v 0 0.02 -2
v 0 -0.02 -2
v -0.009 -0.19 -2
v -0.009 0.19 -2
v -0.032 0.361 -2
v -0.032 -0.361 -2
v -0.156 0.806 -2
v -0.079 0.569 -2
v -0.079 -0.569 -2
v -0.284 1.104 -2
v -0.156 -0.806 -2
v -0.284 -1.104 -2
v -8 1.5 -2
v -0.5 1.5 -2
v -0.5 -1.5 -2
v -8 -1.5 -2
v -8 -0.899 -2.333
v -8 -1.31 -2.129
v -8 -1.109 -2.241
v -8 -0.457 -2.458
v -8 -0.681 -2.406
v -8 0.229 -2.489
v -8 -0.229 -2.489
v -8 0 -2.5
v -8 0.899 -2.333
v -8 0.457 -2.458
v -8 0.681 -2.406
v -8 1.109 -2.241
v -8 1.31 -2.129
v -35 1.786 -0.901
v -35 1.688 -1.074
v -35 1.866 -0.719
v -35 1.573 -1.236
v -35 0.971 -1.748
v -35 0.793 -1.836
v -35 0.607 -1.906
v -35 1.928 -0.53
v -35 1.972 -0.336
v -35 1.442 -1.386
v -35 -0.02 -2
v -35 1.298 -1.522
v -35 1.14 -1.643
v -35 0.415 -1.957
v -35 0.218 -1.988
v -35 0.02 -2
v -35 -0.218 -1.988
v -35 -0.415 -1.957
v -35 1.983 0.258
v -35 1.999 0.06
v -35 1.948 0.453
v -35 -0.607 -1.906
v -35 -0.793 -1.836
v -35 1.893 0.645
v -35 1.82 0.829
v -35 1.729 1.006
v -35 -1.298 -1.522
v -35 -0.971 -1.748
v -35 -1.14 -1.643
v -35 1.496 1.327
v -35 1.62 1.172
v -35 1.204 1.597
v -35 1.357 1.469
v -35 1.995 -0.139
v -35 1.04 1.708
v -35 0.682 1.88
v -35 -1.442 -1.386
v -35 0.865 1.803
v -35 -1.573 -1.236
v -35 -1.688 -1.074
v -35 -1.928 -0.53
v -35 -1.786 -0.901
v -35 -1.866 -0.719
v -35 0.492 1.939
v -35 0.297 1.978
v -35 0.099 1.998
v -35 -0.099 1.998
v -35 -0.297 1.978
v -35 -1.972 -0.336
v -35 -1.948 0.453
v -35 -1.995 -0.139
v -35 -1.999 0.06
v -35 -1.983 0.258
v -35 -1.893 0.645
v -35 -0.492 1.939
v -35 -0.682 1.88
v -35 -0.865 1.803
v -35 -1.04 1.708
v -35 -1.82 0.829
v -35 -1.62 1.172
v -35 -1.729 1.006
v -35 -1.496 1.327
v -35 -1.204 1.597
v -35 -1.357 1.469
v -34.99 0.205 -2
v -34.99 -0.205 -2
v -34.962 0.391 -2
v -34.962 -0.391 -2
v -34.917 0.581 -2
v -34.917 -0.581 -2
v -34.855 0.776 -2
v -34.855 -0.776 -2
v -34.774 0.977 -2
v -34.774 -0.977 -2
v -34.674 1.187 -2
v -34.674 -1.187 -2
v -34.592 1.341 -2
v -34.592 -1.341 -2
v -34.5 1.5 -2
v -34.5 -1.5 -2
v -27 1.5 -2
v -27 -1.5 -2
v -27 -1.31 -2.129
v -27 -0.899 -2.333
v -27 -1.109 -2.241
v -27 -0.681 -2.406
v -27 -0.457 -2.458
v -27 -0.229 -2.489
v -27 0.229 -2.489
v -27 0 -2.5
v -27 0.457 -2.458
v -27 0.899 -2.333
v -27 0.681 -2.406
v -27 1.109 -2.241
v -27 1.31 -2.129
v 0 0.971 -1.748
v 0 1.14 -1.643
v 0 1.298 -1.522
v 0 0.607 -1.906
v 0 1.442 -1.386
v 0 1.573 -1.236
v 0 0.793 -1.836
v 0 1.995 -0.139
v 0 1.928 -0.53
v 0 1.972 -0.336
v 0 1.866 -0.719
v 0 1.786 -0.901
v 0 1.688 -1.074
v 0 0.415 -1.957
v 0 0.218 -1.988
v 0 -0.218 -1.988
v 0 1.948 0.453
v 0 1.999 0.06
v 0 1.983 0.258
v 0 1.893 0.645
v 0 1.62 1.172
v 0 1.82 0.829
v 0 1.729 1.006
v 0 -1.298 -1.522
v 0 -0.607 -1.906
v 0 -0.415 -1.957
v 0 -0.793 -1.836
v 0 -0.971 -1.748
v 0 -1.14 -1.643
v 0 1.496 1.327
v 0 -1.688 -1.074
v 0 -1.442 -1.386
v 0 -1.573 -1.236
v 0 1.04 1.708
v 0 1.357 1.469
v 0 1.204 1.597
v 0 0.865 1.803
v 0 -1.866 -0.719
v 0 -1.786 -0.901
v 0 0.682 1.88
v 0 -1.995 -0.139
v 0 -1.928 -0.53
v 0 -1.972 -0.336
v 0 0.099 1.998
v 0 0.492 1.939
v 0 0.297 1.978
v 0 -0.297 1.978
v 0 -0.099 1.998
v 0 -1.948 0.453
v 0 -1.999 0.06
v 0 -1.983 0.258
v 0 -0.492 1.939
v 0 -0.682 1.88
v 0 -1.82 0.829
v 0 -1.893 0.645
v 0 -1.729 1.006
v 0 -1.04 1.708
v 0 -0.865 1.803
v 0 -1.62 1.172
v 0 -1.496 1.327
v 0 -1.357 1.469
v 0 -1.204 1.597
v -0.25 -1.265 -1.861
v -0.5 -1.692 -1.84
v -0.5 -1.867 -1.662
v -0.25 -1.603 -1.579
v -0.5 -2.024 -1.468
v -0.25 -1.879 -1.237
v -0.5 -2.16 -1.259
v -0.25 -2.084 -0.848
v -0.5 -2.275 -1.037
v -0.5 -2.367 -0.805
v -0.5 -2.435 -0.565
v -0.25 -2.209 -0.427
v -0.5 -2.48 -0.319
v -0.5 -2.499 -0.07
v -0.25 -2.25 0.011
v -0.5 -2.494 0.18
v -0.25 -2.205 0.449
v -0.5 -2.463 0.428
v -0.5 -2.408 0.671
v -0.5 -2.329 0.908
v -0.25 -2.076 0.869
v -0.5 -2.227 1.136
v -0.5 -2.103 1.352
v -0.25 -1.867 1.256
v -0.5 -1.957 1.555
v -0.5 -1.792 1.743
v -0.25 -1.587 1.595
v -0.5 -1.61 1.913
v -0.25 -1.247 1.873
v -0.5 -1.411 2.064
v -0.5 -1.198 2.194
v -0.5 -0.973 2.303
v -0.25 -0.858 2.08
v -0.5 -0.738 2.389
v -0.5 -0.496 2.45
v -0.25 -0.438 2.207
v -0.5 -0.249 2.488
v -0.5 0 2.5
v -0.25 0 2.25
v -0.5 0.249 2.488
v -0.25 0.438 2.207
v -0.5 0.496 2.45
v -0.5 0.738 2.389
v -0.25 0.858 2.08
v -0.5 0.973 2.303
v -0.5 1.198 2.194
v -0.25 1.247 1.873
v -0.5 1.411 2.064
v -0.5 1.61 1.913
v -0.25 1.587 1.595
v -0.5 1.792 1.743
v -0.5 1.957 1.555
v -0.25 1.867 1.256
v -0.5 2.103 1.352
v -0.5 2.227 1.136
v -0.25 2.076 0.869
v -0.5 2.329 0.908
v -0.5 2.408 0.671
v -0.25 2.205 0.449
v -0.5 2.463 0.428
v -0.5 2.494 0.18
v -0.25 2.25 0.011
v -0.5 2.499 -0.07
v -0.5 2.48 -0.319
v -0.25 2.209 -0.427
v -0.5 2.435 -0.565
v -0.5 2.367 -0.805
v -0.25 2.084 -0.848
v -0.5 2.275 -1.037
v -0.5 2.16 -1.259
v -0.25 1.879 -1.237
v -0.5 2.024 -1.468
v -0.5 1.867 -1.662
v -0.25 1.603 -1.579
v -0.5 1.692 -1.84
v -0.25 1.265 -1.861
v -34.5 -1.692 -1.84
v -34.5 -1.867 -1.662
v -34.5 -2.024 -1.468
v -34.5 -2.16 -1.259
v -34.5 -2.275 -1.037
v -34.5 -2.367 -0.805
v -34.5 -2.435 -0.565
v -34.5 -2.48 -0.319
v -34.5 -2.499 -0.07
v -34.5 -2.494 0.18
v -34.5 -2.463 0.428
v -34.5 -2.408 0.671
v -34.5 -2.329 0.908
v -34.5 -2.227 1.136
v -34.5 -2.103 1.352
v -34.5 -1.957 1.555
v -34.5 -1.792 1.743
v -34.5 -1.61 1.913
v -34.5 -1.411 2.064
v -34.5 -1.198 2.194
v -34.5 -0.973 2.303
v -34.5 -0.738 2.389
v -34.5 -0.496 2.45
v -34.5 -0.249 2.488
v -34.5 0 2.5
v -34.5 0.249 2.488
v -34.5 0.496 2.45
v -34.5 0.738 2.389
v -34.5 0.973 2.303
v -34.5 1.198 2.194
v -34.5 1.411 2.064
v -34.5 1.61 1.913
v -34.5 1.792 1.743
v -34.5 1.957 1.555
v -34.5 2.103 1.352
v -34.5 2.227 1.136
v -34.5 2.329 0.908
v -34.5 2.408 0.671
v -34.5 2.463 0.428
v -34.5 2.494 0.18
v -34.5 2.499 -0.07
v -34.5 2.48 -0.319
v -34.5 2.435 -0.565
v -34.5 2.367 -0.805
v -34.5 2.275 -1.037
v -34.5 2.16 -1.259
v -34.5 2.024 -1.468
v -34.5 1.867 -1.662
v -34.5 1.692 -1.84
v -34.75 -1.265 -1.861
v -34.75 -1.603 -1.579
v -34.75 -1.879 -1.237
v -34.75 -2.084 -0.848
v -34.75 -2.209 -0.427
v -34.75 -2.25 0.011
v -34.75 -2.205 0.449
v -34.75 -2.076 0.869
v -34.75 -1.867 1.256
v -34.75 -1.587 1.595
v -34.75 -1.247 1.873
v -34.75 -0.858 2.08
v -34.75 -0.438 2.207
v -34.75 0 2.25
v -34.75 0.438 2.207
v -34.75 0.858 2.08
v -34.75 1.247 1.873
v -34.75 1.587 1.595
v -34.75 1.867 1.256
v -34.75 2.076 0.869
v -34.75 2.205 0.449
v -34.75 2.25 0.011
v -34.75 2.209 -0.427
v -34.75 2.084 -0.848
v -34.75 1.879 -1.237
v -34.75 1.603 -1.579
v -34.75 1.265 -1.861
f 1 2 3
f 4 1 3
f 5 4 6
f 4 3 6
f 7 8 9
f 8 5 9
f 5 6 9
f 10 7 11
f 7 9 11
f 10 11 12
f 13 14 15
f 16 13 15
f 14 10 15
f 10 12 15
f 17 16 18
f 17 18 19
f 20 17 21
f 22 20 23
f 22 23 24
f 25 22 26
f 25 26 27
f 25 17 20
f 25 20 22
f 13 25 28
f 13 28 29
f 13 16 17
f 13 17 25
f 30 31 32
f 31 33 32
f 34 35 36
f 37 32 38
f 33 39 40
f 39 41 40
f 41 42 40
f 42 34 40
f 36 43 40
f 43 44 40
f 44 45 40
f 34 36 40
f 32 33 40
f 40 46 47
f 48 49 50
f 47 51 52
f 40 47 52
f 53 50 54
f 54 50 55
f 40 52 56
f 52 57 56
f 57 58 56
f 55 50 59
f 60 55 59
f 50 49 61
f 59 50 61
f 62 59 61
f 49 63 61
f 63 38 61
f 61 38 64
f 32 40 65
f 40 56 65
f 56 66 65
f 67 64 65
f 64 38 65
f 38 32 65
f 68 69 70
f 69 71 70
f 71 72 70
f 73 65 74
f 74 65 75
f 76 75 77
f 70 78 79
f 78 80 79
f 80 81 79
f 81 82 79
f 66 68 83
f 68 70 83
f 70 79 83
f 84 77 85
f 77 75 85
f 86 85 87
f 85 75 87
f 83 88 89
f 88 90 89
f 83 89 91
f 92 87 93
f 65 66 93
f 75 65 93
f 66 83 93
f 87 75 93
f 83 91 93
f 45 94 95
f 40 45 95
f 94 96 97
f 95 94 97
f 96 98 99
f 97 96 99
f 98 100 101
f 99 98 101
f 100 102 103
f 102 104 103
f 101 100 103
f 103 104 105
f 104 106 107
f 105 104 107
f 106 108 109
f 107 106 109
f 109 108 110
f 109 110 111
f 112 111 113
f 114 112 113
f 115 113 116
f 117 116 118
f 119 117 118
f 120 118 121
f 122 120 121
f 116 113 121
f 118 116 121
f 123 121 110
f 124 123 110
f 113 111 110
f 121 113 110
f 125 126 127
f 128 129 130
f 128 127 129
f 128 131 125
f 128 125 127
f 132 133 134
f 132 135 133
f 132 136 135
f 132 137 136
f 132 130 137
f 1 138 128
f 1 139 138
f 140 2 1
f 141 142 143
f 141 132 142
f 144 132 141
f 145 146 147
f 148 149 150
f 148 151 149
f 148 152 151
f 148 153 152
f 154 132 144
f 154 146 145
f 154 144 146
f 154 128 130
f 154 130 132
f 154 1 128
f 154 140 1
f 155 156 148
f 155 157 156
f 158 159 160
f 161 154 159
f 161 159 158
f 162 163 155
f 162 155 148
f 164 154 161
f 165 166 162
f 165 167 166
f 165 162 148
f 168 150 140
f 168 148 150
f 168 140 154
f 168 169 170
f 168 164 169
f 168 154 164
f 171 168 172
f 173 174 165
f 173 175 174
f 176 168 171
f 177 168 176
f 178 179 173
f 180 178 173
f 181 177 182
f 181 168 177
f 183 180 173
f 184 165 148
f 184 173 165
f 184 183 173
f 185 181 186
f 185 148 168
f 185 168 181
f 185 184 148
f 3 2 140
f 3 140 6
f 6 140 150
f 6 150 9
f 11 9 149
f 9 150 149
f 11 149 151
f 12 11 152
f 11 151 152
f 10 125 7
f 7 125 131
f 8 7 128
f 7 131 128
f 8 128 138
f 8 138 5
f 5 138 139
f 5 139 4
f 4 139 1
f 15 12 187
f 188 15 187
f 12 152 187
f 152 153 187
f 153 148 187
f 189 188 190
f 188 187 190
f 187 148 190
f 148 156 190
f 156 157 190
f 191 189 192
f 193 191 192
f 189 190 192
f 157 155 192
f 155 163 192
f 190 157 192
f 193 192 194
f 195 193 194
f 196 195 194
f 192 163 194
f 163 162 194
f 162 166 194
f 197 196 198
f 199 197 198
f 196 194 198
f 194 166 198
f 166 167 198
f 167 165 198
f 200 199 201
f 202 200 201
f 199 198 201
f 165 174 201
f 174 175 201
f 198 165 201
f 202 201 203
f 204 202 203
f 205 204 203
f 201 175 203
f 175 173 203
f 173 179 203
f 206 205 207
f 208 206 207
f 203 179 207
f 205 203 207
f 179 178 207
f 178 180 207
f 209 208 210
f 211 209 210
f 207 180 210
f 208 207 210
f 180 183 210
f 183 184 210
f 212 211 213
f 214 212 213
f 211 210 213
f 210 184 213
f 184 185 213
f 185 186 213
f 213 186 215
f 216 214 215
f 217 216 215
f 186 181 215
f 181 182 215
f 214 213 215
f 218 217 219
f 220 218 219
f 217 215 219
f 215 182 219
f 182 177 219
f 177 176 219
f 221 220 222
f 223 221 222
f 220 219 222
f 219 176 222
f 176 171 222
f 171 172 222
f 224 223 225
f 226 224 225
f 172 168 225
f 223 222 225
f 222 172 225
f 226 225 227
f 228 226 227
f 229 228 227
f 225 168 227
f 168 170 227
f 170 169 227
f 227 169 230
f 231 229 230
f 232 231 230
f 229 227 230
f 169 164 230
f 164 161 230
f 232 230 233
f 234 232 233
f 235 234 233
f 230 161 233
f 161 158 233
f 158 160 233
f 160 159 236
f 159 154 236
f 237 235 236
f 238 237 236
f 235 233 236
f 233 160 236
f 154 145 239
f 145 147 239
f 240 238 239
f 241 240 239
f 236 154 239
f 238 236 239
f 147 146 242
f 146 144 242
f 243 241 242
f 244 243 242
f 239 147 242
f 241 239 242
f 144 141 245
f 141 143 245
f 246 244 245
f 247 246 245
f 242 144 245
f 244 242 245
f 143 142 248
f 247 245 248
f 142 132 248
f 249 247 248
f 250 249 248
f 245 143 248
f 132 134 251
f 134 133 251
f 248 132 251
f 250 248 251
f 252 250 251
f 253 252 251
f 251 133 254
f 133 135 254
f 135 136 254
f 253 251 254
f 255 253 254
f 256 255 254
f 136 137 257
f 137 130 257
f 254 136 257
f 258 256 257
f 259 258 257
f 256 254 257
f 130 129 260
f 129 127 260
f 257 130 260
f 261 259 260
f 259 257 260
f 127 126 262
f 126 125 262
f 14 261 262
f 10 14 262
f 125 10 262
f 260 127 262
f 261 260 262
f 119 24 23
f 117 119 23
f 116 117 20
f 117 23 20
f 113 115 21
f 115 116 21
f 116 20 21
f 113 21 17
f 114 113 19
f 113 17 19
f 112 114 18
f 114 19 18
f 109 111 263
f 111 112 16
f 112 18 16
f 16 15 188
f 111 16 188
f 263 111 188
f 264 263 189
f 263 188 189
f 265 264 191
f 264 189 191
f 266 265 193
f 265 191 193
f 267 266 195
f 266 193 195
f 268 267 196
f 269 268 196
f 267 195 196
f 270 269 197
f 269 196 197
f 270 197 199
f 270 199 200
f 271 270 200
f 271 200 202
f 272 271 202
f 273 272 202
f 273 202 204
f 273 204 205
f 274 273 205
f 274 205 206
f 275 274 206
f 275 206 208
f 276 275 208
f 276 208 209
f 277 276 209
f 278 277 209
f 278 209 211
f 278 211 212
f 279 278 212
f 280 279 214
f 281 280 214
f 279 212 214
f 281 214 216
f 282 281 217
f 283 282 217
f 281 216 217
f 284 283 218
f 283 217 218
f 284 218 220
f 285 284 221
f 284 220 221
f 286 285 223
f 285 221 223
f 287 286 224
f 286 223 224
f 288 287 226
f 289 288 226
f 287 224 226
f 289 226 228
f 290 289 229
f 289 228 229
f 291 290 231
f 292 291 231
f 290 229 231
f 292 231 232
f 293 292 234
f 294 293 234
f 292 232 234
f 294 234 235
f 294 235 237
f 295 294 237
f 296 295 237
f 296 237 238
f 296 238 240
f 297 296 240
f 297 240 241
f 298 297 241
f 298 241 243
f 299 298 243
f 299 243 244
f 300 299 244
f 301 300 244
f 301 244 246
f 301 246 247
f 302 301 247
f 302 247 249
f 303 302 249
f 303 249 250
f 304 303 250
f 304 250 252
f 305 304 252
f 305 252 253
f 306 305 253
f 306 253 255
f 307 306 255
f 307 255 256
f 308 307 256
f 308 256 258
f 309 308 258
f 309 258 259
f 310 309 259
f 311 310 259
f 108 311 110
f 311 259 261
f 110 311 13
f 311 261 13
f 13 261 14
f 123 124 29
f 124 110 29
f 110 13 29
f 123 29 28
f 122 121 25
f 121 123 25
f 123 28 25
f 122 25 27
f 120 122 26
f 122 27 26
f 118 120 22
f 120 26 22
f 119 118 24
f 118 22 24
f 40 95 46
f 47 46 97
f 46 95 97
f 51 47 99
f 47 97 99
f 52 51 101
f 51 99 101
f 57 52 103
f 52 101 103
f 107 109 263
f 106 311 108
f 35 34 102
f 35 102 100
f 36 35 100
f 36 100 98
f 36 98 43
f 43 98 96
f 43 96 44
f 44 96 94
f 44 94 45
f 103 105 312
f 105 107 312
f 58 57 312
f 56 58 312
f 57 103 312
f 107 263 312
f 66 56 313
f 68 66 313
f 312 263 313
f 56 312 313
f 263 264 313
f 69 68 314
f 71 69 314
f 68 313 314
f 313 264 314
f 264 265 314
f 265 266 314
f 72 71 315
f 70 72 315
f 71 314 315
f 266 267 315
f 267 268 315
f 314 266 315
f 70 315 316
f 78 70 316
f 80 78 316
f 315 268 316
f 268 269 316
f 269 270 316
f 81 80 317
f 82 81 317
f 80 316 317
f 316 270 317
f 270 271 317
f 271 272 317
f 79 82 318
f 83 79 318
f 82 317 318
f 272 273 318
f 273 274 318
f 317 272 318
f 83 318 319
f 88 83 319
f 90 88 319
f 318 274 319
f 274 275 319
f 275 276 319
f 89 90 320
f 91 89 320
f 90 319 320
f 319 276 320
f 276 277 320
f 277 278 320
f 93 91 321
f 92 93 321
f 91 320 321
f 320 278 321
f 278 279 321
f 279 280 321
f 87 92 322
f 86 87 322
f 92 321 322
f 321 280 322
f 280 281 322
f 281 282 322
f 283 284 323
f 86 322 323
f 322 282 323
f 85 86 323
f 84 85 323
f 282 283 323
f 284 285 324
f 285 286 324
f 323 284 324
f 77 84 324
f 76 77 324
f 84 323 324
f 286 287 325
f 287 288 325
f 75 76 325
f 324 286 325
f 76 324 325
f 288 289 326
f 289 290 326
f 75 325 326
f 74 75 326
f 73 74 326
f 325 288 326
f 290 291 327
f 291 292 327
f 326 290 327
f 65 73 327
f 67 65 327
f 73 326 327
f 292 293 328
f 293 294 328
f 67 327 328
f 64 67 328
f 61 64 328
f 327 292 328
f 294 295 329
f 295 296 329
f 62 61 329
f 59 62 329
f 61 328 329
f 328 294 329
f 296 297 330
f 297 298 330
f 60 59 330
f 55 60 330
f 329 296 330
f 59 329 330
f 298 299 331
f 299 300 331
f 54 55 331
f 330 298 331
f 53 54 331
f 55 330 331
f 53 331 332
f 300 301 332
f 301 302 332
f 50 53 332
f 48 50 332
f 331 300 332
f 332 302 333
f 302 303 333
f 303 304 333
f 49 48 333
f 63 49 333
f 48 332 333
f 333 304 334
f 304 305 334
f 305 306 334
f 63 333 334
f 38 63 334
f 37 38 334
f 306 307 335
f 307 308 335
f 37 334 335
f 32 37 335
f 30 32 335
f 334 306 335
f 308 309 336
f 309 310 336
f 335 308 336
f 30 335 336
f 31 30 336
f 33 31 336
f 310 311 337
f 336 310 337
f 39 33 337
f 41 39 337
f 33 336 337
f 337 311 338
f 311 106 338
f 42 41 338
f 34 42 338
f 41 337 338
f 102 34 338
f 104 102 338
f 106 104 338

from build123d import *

# Parameters (mm, degrees)
SKETCH1_W          = 35
SKETCH1_H          = 2.5
CUT_EXTRUDE1_START = -8
CUT_EXTRUDE1_DEPTH = 8
CUT_EXTRUDE2_DEPTH = 8
CHAMFER1_SIZE      = 0.5


with BuildPart() as part:
    # Sketch1 → Revolve1 (revolve)
    with BuildSketch(Plane(origin=(0, 0, 0), x_dir=(1, 0, 0), z_dir=(0, 1, 0))):
        with Locations((-17.5, 1.25)):
            Rectangle(SKETCH1_W, SKETCH1_H)
    revolve(axis=Axis((0, 0, 0), (-1, 0, 0)))

    # Sketch2 → Cut-Extrude1 (cut)
    with BuildSketch(Plane.ZY.offset(35).offset(CUT_EXTRUDE1_START)):
        with BuildLine():
            Line((-2, 1.5), (-2, -1.5))
            ThreePointArc((-2, -1.5), (-2.5, 0), (-2, 1.5))
        make_face()
    extrude(amount=CUT_EXTRUDE1_DEPTH, mode=Mode.SUBTRACT)

    # Sketch3 → Cut-Extrude2 (cut)
    with BuildSketch(Plane(origin=(0, 0, 0), x_dir=(0, 0, -1), z_dir=(1, 0, 0))):
        with BuildLine():
            Line((2, 1.5), (2, -1.5))
            ThreePointArc((2, -1.5), (2.5, 0), (2, 1.5))
        make_face()
    extrude(amount=-CUT_EXTRUDE2_DEPTH, mode=Mode.SUBTRACT)

    # Chamfer1
    chamfer1_edges = [part.edges().sort_by_distance(p)[0] for p in [
        (0, 0, 2.5),
        (-35, 0, 2.5),
    ]]
    chamfer(chamfer1_edges, length=CHAMFER1_SIZE - 0.0001)  # a hair under: the kernel refuses the full size


solid = part.part
